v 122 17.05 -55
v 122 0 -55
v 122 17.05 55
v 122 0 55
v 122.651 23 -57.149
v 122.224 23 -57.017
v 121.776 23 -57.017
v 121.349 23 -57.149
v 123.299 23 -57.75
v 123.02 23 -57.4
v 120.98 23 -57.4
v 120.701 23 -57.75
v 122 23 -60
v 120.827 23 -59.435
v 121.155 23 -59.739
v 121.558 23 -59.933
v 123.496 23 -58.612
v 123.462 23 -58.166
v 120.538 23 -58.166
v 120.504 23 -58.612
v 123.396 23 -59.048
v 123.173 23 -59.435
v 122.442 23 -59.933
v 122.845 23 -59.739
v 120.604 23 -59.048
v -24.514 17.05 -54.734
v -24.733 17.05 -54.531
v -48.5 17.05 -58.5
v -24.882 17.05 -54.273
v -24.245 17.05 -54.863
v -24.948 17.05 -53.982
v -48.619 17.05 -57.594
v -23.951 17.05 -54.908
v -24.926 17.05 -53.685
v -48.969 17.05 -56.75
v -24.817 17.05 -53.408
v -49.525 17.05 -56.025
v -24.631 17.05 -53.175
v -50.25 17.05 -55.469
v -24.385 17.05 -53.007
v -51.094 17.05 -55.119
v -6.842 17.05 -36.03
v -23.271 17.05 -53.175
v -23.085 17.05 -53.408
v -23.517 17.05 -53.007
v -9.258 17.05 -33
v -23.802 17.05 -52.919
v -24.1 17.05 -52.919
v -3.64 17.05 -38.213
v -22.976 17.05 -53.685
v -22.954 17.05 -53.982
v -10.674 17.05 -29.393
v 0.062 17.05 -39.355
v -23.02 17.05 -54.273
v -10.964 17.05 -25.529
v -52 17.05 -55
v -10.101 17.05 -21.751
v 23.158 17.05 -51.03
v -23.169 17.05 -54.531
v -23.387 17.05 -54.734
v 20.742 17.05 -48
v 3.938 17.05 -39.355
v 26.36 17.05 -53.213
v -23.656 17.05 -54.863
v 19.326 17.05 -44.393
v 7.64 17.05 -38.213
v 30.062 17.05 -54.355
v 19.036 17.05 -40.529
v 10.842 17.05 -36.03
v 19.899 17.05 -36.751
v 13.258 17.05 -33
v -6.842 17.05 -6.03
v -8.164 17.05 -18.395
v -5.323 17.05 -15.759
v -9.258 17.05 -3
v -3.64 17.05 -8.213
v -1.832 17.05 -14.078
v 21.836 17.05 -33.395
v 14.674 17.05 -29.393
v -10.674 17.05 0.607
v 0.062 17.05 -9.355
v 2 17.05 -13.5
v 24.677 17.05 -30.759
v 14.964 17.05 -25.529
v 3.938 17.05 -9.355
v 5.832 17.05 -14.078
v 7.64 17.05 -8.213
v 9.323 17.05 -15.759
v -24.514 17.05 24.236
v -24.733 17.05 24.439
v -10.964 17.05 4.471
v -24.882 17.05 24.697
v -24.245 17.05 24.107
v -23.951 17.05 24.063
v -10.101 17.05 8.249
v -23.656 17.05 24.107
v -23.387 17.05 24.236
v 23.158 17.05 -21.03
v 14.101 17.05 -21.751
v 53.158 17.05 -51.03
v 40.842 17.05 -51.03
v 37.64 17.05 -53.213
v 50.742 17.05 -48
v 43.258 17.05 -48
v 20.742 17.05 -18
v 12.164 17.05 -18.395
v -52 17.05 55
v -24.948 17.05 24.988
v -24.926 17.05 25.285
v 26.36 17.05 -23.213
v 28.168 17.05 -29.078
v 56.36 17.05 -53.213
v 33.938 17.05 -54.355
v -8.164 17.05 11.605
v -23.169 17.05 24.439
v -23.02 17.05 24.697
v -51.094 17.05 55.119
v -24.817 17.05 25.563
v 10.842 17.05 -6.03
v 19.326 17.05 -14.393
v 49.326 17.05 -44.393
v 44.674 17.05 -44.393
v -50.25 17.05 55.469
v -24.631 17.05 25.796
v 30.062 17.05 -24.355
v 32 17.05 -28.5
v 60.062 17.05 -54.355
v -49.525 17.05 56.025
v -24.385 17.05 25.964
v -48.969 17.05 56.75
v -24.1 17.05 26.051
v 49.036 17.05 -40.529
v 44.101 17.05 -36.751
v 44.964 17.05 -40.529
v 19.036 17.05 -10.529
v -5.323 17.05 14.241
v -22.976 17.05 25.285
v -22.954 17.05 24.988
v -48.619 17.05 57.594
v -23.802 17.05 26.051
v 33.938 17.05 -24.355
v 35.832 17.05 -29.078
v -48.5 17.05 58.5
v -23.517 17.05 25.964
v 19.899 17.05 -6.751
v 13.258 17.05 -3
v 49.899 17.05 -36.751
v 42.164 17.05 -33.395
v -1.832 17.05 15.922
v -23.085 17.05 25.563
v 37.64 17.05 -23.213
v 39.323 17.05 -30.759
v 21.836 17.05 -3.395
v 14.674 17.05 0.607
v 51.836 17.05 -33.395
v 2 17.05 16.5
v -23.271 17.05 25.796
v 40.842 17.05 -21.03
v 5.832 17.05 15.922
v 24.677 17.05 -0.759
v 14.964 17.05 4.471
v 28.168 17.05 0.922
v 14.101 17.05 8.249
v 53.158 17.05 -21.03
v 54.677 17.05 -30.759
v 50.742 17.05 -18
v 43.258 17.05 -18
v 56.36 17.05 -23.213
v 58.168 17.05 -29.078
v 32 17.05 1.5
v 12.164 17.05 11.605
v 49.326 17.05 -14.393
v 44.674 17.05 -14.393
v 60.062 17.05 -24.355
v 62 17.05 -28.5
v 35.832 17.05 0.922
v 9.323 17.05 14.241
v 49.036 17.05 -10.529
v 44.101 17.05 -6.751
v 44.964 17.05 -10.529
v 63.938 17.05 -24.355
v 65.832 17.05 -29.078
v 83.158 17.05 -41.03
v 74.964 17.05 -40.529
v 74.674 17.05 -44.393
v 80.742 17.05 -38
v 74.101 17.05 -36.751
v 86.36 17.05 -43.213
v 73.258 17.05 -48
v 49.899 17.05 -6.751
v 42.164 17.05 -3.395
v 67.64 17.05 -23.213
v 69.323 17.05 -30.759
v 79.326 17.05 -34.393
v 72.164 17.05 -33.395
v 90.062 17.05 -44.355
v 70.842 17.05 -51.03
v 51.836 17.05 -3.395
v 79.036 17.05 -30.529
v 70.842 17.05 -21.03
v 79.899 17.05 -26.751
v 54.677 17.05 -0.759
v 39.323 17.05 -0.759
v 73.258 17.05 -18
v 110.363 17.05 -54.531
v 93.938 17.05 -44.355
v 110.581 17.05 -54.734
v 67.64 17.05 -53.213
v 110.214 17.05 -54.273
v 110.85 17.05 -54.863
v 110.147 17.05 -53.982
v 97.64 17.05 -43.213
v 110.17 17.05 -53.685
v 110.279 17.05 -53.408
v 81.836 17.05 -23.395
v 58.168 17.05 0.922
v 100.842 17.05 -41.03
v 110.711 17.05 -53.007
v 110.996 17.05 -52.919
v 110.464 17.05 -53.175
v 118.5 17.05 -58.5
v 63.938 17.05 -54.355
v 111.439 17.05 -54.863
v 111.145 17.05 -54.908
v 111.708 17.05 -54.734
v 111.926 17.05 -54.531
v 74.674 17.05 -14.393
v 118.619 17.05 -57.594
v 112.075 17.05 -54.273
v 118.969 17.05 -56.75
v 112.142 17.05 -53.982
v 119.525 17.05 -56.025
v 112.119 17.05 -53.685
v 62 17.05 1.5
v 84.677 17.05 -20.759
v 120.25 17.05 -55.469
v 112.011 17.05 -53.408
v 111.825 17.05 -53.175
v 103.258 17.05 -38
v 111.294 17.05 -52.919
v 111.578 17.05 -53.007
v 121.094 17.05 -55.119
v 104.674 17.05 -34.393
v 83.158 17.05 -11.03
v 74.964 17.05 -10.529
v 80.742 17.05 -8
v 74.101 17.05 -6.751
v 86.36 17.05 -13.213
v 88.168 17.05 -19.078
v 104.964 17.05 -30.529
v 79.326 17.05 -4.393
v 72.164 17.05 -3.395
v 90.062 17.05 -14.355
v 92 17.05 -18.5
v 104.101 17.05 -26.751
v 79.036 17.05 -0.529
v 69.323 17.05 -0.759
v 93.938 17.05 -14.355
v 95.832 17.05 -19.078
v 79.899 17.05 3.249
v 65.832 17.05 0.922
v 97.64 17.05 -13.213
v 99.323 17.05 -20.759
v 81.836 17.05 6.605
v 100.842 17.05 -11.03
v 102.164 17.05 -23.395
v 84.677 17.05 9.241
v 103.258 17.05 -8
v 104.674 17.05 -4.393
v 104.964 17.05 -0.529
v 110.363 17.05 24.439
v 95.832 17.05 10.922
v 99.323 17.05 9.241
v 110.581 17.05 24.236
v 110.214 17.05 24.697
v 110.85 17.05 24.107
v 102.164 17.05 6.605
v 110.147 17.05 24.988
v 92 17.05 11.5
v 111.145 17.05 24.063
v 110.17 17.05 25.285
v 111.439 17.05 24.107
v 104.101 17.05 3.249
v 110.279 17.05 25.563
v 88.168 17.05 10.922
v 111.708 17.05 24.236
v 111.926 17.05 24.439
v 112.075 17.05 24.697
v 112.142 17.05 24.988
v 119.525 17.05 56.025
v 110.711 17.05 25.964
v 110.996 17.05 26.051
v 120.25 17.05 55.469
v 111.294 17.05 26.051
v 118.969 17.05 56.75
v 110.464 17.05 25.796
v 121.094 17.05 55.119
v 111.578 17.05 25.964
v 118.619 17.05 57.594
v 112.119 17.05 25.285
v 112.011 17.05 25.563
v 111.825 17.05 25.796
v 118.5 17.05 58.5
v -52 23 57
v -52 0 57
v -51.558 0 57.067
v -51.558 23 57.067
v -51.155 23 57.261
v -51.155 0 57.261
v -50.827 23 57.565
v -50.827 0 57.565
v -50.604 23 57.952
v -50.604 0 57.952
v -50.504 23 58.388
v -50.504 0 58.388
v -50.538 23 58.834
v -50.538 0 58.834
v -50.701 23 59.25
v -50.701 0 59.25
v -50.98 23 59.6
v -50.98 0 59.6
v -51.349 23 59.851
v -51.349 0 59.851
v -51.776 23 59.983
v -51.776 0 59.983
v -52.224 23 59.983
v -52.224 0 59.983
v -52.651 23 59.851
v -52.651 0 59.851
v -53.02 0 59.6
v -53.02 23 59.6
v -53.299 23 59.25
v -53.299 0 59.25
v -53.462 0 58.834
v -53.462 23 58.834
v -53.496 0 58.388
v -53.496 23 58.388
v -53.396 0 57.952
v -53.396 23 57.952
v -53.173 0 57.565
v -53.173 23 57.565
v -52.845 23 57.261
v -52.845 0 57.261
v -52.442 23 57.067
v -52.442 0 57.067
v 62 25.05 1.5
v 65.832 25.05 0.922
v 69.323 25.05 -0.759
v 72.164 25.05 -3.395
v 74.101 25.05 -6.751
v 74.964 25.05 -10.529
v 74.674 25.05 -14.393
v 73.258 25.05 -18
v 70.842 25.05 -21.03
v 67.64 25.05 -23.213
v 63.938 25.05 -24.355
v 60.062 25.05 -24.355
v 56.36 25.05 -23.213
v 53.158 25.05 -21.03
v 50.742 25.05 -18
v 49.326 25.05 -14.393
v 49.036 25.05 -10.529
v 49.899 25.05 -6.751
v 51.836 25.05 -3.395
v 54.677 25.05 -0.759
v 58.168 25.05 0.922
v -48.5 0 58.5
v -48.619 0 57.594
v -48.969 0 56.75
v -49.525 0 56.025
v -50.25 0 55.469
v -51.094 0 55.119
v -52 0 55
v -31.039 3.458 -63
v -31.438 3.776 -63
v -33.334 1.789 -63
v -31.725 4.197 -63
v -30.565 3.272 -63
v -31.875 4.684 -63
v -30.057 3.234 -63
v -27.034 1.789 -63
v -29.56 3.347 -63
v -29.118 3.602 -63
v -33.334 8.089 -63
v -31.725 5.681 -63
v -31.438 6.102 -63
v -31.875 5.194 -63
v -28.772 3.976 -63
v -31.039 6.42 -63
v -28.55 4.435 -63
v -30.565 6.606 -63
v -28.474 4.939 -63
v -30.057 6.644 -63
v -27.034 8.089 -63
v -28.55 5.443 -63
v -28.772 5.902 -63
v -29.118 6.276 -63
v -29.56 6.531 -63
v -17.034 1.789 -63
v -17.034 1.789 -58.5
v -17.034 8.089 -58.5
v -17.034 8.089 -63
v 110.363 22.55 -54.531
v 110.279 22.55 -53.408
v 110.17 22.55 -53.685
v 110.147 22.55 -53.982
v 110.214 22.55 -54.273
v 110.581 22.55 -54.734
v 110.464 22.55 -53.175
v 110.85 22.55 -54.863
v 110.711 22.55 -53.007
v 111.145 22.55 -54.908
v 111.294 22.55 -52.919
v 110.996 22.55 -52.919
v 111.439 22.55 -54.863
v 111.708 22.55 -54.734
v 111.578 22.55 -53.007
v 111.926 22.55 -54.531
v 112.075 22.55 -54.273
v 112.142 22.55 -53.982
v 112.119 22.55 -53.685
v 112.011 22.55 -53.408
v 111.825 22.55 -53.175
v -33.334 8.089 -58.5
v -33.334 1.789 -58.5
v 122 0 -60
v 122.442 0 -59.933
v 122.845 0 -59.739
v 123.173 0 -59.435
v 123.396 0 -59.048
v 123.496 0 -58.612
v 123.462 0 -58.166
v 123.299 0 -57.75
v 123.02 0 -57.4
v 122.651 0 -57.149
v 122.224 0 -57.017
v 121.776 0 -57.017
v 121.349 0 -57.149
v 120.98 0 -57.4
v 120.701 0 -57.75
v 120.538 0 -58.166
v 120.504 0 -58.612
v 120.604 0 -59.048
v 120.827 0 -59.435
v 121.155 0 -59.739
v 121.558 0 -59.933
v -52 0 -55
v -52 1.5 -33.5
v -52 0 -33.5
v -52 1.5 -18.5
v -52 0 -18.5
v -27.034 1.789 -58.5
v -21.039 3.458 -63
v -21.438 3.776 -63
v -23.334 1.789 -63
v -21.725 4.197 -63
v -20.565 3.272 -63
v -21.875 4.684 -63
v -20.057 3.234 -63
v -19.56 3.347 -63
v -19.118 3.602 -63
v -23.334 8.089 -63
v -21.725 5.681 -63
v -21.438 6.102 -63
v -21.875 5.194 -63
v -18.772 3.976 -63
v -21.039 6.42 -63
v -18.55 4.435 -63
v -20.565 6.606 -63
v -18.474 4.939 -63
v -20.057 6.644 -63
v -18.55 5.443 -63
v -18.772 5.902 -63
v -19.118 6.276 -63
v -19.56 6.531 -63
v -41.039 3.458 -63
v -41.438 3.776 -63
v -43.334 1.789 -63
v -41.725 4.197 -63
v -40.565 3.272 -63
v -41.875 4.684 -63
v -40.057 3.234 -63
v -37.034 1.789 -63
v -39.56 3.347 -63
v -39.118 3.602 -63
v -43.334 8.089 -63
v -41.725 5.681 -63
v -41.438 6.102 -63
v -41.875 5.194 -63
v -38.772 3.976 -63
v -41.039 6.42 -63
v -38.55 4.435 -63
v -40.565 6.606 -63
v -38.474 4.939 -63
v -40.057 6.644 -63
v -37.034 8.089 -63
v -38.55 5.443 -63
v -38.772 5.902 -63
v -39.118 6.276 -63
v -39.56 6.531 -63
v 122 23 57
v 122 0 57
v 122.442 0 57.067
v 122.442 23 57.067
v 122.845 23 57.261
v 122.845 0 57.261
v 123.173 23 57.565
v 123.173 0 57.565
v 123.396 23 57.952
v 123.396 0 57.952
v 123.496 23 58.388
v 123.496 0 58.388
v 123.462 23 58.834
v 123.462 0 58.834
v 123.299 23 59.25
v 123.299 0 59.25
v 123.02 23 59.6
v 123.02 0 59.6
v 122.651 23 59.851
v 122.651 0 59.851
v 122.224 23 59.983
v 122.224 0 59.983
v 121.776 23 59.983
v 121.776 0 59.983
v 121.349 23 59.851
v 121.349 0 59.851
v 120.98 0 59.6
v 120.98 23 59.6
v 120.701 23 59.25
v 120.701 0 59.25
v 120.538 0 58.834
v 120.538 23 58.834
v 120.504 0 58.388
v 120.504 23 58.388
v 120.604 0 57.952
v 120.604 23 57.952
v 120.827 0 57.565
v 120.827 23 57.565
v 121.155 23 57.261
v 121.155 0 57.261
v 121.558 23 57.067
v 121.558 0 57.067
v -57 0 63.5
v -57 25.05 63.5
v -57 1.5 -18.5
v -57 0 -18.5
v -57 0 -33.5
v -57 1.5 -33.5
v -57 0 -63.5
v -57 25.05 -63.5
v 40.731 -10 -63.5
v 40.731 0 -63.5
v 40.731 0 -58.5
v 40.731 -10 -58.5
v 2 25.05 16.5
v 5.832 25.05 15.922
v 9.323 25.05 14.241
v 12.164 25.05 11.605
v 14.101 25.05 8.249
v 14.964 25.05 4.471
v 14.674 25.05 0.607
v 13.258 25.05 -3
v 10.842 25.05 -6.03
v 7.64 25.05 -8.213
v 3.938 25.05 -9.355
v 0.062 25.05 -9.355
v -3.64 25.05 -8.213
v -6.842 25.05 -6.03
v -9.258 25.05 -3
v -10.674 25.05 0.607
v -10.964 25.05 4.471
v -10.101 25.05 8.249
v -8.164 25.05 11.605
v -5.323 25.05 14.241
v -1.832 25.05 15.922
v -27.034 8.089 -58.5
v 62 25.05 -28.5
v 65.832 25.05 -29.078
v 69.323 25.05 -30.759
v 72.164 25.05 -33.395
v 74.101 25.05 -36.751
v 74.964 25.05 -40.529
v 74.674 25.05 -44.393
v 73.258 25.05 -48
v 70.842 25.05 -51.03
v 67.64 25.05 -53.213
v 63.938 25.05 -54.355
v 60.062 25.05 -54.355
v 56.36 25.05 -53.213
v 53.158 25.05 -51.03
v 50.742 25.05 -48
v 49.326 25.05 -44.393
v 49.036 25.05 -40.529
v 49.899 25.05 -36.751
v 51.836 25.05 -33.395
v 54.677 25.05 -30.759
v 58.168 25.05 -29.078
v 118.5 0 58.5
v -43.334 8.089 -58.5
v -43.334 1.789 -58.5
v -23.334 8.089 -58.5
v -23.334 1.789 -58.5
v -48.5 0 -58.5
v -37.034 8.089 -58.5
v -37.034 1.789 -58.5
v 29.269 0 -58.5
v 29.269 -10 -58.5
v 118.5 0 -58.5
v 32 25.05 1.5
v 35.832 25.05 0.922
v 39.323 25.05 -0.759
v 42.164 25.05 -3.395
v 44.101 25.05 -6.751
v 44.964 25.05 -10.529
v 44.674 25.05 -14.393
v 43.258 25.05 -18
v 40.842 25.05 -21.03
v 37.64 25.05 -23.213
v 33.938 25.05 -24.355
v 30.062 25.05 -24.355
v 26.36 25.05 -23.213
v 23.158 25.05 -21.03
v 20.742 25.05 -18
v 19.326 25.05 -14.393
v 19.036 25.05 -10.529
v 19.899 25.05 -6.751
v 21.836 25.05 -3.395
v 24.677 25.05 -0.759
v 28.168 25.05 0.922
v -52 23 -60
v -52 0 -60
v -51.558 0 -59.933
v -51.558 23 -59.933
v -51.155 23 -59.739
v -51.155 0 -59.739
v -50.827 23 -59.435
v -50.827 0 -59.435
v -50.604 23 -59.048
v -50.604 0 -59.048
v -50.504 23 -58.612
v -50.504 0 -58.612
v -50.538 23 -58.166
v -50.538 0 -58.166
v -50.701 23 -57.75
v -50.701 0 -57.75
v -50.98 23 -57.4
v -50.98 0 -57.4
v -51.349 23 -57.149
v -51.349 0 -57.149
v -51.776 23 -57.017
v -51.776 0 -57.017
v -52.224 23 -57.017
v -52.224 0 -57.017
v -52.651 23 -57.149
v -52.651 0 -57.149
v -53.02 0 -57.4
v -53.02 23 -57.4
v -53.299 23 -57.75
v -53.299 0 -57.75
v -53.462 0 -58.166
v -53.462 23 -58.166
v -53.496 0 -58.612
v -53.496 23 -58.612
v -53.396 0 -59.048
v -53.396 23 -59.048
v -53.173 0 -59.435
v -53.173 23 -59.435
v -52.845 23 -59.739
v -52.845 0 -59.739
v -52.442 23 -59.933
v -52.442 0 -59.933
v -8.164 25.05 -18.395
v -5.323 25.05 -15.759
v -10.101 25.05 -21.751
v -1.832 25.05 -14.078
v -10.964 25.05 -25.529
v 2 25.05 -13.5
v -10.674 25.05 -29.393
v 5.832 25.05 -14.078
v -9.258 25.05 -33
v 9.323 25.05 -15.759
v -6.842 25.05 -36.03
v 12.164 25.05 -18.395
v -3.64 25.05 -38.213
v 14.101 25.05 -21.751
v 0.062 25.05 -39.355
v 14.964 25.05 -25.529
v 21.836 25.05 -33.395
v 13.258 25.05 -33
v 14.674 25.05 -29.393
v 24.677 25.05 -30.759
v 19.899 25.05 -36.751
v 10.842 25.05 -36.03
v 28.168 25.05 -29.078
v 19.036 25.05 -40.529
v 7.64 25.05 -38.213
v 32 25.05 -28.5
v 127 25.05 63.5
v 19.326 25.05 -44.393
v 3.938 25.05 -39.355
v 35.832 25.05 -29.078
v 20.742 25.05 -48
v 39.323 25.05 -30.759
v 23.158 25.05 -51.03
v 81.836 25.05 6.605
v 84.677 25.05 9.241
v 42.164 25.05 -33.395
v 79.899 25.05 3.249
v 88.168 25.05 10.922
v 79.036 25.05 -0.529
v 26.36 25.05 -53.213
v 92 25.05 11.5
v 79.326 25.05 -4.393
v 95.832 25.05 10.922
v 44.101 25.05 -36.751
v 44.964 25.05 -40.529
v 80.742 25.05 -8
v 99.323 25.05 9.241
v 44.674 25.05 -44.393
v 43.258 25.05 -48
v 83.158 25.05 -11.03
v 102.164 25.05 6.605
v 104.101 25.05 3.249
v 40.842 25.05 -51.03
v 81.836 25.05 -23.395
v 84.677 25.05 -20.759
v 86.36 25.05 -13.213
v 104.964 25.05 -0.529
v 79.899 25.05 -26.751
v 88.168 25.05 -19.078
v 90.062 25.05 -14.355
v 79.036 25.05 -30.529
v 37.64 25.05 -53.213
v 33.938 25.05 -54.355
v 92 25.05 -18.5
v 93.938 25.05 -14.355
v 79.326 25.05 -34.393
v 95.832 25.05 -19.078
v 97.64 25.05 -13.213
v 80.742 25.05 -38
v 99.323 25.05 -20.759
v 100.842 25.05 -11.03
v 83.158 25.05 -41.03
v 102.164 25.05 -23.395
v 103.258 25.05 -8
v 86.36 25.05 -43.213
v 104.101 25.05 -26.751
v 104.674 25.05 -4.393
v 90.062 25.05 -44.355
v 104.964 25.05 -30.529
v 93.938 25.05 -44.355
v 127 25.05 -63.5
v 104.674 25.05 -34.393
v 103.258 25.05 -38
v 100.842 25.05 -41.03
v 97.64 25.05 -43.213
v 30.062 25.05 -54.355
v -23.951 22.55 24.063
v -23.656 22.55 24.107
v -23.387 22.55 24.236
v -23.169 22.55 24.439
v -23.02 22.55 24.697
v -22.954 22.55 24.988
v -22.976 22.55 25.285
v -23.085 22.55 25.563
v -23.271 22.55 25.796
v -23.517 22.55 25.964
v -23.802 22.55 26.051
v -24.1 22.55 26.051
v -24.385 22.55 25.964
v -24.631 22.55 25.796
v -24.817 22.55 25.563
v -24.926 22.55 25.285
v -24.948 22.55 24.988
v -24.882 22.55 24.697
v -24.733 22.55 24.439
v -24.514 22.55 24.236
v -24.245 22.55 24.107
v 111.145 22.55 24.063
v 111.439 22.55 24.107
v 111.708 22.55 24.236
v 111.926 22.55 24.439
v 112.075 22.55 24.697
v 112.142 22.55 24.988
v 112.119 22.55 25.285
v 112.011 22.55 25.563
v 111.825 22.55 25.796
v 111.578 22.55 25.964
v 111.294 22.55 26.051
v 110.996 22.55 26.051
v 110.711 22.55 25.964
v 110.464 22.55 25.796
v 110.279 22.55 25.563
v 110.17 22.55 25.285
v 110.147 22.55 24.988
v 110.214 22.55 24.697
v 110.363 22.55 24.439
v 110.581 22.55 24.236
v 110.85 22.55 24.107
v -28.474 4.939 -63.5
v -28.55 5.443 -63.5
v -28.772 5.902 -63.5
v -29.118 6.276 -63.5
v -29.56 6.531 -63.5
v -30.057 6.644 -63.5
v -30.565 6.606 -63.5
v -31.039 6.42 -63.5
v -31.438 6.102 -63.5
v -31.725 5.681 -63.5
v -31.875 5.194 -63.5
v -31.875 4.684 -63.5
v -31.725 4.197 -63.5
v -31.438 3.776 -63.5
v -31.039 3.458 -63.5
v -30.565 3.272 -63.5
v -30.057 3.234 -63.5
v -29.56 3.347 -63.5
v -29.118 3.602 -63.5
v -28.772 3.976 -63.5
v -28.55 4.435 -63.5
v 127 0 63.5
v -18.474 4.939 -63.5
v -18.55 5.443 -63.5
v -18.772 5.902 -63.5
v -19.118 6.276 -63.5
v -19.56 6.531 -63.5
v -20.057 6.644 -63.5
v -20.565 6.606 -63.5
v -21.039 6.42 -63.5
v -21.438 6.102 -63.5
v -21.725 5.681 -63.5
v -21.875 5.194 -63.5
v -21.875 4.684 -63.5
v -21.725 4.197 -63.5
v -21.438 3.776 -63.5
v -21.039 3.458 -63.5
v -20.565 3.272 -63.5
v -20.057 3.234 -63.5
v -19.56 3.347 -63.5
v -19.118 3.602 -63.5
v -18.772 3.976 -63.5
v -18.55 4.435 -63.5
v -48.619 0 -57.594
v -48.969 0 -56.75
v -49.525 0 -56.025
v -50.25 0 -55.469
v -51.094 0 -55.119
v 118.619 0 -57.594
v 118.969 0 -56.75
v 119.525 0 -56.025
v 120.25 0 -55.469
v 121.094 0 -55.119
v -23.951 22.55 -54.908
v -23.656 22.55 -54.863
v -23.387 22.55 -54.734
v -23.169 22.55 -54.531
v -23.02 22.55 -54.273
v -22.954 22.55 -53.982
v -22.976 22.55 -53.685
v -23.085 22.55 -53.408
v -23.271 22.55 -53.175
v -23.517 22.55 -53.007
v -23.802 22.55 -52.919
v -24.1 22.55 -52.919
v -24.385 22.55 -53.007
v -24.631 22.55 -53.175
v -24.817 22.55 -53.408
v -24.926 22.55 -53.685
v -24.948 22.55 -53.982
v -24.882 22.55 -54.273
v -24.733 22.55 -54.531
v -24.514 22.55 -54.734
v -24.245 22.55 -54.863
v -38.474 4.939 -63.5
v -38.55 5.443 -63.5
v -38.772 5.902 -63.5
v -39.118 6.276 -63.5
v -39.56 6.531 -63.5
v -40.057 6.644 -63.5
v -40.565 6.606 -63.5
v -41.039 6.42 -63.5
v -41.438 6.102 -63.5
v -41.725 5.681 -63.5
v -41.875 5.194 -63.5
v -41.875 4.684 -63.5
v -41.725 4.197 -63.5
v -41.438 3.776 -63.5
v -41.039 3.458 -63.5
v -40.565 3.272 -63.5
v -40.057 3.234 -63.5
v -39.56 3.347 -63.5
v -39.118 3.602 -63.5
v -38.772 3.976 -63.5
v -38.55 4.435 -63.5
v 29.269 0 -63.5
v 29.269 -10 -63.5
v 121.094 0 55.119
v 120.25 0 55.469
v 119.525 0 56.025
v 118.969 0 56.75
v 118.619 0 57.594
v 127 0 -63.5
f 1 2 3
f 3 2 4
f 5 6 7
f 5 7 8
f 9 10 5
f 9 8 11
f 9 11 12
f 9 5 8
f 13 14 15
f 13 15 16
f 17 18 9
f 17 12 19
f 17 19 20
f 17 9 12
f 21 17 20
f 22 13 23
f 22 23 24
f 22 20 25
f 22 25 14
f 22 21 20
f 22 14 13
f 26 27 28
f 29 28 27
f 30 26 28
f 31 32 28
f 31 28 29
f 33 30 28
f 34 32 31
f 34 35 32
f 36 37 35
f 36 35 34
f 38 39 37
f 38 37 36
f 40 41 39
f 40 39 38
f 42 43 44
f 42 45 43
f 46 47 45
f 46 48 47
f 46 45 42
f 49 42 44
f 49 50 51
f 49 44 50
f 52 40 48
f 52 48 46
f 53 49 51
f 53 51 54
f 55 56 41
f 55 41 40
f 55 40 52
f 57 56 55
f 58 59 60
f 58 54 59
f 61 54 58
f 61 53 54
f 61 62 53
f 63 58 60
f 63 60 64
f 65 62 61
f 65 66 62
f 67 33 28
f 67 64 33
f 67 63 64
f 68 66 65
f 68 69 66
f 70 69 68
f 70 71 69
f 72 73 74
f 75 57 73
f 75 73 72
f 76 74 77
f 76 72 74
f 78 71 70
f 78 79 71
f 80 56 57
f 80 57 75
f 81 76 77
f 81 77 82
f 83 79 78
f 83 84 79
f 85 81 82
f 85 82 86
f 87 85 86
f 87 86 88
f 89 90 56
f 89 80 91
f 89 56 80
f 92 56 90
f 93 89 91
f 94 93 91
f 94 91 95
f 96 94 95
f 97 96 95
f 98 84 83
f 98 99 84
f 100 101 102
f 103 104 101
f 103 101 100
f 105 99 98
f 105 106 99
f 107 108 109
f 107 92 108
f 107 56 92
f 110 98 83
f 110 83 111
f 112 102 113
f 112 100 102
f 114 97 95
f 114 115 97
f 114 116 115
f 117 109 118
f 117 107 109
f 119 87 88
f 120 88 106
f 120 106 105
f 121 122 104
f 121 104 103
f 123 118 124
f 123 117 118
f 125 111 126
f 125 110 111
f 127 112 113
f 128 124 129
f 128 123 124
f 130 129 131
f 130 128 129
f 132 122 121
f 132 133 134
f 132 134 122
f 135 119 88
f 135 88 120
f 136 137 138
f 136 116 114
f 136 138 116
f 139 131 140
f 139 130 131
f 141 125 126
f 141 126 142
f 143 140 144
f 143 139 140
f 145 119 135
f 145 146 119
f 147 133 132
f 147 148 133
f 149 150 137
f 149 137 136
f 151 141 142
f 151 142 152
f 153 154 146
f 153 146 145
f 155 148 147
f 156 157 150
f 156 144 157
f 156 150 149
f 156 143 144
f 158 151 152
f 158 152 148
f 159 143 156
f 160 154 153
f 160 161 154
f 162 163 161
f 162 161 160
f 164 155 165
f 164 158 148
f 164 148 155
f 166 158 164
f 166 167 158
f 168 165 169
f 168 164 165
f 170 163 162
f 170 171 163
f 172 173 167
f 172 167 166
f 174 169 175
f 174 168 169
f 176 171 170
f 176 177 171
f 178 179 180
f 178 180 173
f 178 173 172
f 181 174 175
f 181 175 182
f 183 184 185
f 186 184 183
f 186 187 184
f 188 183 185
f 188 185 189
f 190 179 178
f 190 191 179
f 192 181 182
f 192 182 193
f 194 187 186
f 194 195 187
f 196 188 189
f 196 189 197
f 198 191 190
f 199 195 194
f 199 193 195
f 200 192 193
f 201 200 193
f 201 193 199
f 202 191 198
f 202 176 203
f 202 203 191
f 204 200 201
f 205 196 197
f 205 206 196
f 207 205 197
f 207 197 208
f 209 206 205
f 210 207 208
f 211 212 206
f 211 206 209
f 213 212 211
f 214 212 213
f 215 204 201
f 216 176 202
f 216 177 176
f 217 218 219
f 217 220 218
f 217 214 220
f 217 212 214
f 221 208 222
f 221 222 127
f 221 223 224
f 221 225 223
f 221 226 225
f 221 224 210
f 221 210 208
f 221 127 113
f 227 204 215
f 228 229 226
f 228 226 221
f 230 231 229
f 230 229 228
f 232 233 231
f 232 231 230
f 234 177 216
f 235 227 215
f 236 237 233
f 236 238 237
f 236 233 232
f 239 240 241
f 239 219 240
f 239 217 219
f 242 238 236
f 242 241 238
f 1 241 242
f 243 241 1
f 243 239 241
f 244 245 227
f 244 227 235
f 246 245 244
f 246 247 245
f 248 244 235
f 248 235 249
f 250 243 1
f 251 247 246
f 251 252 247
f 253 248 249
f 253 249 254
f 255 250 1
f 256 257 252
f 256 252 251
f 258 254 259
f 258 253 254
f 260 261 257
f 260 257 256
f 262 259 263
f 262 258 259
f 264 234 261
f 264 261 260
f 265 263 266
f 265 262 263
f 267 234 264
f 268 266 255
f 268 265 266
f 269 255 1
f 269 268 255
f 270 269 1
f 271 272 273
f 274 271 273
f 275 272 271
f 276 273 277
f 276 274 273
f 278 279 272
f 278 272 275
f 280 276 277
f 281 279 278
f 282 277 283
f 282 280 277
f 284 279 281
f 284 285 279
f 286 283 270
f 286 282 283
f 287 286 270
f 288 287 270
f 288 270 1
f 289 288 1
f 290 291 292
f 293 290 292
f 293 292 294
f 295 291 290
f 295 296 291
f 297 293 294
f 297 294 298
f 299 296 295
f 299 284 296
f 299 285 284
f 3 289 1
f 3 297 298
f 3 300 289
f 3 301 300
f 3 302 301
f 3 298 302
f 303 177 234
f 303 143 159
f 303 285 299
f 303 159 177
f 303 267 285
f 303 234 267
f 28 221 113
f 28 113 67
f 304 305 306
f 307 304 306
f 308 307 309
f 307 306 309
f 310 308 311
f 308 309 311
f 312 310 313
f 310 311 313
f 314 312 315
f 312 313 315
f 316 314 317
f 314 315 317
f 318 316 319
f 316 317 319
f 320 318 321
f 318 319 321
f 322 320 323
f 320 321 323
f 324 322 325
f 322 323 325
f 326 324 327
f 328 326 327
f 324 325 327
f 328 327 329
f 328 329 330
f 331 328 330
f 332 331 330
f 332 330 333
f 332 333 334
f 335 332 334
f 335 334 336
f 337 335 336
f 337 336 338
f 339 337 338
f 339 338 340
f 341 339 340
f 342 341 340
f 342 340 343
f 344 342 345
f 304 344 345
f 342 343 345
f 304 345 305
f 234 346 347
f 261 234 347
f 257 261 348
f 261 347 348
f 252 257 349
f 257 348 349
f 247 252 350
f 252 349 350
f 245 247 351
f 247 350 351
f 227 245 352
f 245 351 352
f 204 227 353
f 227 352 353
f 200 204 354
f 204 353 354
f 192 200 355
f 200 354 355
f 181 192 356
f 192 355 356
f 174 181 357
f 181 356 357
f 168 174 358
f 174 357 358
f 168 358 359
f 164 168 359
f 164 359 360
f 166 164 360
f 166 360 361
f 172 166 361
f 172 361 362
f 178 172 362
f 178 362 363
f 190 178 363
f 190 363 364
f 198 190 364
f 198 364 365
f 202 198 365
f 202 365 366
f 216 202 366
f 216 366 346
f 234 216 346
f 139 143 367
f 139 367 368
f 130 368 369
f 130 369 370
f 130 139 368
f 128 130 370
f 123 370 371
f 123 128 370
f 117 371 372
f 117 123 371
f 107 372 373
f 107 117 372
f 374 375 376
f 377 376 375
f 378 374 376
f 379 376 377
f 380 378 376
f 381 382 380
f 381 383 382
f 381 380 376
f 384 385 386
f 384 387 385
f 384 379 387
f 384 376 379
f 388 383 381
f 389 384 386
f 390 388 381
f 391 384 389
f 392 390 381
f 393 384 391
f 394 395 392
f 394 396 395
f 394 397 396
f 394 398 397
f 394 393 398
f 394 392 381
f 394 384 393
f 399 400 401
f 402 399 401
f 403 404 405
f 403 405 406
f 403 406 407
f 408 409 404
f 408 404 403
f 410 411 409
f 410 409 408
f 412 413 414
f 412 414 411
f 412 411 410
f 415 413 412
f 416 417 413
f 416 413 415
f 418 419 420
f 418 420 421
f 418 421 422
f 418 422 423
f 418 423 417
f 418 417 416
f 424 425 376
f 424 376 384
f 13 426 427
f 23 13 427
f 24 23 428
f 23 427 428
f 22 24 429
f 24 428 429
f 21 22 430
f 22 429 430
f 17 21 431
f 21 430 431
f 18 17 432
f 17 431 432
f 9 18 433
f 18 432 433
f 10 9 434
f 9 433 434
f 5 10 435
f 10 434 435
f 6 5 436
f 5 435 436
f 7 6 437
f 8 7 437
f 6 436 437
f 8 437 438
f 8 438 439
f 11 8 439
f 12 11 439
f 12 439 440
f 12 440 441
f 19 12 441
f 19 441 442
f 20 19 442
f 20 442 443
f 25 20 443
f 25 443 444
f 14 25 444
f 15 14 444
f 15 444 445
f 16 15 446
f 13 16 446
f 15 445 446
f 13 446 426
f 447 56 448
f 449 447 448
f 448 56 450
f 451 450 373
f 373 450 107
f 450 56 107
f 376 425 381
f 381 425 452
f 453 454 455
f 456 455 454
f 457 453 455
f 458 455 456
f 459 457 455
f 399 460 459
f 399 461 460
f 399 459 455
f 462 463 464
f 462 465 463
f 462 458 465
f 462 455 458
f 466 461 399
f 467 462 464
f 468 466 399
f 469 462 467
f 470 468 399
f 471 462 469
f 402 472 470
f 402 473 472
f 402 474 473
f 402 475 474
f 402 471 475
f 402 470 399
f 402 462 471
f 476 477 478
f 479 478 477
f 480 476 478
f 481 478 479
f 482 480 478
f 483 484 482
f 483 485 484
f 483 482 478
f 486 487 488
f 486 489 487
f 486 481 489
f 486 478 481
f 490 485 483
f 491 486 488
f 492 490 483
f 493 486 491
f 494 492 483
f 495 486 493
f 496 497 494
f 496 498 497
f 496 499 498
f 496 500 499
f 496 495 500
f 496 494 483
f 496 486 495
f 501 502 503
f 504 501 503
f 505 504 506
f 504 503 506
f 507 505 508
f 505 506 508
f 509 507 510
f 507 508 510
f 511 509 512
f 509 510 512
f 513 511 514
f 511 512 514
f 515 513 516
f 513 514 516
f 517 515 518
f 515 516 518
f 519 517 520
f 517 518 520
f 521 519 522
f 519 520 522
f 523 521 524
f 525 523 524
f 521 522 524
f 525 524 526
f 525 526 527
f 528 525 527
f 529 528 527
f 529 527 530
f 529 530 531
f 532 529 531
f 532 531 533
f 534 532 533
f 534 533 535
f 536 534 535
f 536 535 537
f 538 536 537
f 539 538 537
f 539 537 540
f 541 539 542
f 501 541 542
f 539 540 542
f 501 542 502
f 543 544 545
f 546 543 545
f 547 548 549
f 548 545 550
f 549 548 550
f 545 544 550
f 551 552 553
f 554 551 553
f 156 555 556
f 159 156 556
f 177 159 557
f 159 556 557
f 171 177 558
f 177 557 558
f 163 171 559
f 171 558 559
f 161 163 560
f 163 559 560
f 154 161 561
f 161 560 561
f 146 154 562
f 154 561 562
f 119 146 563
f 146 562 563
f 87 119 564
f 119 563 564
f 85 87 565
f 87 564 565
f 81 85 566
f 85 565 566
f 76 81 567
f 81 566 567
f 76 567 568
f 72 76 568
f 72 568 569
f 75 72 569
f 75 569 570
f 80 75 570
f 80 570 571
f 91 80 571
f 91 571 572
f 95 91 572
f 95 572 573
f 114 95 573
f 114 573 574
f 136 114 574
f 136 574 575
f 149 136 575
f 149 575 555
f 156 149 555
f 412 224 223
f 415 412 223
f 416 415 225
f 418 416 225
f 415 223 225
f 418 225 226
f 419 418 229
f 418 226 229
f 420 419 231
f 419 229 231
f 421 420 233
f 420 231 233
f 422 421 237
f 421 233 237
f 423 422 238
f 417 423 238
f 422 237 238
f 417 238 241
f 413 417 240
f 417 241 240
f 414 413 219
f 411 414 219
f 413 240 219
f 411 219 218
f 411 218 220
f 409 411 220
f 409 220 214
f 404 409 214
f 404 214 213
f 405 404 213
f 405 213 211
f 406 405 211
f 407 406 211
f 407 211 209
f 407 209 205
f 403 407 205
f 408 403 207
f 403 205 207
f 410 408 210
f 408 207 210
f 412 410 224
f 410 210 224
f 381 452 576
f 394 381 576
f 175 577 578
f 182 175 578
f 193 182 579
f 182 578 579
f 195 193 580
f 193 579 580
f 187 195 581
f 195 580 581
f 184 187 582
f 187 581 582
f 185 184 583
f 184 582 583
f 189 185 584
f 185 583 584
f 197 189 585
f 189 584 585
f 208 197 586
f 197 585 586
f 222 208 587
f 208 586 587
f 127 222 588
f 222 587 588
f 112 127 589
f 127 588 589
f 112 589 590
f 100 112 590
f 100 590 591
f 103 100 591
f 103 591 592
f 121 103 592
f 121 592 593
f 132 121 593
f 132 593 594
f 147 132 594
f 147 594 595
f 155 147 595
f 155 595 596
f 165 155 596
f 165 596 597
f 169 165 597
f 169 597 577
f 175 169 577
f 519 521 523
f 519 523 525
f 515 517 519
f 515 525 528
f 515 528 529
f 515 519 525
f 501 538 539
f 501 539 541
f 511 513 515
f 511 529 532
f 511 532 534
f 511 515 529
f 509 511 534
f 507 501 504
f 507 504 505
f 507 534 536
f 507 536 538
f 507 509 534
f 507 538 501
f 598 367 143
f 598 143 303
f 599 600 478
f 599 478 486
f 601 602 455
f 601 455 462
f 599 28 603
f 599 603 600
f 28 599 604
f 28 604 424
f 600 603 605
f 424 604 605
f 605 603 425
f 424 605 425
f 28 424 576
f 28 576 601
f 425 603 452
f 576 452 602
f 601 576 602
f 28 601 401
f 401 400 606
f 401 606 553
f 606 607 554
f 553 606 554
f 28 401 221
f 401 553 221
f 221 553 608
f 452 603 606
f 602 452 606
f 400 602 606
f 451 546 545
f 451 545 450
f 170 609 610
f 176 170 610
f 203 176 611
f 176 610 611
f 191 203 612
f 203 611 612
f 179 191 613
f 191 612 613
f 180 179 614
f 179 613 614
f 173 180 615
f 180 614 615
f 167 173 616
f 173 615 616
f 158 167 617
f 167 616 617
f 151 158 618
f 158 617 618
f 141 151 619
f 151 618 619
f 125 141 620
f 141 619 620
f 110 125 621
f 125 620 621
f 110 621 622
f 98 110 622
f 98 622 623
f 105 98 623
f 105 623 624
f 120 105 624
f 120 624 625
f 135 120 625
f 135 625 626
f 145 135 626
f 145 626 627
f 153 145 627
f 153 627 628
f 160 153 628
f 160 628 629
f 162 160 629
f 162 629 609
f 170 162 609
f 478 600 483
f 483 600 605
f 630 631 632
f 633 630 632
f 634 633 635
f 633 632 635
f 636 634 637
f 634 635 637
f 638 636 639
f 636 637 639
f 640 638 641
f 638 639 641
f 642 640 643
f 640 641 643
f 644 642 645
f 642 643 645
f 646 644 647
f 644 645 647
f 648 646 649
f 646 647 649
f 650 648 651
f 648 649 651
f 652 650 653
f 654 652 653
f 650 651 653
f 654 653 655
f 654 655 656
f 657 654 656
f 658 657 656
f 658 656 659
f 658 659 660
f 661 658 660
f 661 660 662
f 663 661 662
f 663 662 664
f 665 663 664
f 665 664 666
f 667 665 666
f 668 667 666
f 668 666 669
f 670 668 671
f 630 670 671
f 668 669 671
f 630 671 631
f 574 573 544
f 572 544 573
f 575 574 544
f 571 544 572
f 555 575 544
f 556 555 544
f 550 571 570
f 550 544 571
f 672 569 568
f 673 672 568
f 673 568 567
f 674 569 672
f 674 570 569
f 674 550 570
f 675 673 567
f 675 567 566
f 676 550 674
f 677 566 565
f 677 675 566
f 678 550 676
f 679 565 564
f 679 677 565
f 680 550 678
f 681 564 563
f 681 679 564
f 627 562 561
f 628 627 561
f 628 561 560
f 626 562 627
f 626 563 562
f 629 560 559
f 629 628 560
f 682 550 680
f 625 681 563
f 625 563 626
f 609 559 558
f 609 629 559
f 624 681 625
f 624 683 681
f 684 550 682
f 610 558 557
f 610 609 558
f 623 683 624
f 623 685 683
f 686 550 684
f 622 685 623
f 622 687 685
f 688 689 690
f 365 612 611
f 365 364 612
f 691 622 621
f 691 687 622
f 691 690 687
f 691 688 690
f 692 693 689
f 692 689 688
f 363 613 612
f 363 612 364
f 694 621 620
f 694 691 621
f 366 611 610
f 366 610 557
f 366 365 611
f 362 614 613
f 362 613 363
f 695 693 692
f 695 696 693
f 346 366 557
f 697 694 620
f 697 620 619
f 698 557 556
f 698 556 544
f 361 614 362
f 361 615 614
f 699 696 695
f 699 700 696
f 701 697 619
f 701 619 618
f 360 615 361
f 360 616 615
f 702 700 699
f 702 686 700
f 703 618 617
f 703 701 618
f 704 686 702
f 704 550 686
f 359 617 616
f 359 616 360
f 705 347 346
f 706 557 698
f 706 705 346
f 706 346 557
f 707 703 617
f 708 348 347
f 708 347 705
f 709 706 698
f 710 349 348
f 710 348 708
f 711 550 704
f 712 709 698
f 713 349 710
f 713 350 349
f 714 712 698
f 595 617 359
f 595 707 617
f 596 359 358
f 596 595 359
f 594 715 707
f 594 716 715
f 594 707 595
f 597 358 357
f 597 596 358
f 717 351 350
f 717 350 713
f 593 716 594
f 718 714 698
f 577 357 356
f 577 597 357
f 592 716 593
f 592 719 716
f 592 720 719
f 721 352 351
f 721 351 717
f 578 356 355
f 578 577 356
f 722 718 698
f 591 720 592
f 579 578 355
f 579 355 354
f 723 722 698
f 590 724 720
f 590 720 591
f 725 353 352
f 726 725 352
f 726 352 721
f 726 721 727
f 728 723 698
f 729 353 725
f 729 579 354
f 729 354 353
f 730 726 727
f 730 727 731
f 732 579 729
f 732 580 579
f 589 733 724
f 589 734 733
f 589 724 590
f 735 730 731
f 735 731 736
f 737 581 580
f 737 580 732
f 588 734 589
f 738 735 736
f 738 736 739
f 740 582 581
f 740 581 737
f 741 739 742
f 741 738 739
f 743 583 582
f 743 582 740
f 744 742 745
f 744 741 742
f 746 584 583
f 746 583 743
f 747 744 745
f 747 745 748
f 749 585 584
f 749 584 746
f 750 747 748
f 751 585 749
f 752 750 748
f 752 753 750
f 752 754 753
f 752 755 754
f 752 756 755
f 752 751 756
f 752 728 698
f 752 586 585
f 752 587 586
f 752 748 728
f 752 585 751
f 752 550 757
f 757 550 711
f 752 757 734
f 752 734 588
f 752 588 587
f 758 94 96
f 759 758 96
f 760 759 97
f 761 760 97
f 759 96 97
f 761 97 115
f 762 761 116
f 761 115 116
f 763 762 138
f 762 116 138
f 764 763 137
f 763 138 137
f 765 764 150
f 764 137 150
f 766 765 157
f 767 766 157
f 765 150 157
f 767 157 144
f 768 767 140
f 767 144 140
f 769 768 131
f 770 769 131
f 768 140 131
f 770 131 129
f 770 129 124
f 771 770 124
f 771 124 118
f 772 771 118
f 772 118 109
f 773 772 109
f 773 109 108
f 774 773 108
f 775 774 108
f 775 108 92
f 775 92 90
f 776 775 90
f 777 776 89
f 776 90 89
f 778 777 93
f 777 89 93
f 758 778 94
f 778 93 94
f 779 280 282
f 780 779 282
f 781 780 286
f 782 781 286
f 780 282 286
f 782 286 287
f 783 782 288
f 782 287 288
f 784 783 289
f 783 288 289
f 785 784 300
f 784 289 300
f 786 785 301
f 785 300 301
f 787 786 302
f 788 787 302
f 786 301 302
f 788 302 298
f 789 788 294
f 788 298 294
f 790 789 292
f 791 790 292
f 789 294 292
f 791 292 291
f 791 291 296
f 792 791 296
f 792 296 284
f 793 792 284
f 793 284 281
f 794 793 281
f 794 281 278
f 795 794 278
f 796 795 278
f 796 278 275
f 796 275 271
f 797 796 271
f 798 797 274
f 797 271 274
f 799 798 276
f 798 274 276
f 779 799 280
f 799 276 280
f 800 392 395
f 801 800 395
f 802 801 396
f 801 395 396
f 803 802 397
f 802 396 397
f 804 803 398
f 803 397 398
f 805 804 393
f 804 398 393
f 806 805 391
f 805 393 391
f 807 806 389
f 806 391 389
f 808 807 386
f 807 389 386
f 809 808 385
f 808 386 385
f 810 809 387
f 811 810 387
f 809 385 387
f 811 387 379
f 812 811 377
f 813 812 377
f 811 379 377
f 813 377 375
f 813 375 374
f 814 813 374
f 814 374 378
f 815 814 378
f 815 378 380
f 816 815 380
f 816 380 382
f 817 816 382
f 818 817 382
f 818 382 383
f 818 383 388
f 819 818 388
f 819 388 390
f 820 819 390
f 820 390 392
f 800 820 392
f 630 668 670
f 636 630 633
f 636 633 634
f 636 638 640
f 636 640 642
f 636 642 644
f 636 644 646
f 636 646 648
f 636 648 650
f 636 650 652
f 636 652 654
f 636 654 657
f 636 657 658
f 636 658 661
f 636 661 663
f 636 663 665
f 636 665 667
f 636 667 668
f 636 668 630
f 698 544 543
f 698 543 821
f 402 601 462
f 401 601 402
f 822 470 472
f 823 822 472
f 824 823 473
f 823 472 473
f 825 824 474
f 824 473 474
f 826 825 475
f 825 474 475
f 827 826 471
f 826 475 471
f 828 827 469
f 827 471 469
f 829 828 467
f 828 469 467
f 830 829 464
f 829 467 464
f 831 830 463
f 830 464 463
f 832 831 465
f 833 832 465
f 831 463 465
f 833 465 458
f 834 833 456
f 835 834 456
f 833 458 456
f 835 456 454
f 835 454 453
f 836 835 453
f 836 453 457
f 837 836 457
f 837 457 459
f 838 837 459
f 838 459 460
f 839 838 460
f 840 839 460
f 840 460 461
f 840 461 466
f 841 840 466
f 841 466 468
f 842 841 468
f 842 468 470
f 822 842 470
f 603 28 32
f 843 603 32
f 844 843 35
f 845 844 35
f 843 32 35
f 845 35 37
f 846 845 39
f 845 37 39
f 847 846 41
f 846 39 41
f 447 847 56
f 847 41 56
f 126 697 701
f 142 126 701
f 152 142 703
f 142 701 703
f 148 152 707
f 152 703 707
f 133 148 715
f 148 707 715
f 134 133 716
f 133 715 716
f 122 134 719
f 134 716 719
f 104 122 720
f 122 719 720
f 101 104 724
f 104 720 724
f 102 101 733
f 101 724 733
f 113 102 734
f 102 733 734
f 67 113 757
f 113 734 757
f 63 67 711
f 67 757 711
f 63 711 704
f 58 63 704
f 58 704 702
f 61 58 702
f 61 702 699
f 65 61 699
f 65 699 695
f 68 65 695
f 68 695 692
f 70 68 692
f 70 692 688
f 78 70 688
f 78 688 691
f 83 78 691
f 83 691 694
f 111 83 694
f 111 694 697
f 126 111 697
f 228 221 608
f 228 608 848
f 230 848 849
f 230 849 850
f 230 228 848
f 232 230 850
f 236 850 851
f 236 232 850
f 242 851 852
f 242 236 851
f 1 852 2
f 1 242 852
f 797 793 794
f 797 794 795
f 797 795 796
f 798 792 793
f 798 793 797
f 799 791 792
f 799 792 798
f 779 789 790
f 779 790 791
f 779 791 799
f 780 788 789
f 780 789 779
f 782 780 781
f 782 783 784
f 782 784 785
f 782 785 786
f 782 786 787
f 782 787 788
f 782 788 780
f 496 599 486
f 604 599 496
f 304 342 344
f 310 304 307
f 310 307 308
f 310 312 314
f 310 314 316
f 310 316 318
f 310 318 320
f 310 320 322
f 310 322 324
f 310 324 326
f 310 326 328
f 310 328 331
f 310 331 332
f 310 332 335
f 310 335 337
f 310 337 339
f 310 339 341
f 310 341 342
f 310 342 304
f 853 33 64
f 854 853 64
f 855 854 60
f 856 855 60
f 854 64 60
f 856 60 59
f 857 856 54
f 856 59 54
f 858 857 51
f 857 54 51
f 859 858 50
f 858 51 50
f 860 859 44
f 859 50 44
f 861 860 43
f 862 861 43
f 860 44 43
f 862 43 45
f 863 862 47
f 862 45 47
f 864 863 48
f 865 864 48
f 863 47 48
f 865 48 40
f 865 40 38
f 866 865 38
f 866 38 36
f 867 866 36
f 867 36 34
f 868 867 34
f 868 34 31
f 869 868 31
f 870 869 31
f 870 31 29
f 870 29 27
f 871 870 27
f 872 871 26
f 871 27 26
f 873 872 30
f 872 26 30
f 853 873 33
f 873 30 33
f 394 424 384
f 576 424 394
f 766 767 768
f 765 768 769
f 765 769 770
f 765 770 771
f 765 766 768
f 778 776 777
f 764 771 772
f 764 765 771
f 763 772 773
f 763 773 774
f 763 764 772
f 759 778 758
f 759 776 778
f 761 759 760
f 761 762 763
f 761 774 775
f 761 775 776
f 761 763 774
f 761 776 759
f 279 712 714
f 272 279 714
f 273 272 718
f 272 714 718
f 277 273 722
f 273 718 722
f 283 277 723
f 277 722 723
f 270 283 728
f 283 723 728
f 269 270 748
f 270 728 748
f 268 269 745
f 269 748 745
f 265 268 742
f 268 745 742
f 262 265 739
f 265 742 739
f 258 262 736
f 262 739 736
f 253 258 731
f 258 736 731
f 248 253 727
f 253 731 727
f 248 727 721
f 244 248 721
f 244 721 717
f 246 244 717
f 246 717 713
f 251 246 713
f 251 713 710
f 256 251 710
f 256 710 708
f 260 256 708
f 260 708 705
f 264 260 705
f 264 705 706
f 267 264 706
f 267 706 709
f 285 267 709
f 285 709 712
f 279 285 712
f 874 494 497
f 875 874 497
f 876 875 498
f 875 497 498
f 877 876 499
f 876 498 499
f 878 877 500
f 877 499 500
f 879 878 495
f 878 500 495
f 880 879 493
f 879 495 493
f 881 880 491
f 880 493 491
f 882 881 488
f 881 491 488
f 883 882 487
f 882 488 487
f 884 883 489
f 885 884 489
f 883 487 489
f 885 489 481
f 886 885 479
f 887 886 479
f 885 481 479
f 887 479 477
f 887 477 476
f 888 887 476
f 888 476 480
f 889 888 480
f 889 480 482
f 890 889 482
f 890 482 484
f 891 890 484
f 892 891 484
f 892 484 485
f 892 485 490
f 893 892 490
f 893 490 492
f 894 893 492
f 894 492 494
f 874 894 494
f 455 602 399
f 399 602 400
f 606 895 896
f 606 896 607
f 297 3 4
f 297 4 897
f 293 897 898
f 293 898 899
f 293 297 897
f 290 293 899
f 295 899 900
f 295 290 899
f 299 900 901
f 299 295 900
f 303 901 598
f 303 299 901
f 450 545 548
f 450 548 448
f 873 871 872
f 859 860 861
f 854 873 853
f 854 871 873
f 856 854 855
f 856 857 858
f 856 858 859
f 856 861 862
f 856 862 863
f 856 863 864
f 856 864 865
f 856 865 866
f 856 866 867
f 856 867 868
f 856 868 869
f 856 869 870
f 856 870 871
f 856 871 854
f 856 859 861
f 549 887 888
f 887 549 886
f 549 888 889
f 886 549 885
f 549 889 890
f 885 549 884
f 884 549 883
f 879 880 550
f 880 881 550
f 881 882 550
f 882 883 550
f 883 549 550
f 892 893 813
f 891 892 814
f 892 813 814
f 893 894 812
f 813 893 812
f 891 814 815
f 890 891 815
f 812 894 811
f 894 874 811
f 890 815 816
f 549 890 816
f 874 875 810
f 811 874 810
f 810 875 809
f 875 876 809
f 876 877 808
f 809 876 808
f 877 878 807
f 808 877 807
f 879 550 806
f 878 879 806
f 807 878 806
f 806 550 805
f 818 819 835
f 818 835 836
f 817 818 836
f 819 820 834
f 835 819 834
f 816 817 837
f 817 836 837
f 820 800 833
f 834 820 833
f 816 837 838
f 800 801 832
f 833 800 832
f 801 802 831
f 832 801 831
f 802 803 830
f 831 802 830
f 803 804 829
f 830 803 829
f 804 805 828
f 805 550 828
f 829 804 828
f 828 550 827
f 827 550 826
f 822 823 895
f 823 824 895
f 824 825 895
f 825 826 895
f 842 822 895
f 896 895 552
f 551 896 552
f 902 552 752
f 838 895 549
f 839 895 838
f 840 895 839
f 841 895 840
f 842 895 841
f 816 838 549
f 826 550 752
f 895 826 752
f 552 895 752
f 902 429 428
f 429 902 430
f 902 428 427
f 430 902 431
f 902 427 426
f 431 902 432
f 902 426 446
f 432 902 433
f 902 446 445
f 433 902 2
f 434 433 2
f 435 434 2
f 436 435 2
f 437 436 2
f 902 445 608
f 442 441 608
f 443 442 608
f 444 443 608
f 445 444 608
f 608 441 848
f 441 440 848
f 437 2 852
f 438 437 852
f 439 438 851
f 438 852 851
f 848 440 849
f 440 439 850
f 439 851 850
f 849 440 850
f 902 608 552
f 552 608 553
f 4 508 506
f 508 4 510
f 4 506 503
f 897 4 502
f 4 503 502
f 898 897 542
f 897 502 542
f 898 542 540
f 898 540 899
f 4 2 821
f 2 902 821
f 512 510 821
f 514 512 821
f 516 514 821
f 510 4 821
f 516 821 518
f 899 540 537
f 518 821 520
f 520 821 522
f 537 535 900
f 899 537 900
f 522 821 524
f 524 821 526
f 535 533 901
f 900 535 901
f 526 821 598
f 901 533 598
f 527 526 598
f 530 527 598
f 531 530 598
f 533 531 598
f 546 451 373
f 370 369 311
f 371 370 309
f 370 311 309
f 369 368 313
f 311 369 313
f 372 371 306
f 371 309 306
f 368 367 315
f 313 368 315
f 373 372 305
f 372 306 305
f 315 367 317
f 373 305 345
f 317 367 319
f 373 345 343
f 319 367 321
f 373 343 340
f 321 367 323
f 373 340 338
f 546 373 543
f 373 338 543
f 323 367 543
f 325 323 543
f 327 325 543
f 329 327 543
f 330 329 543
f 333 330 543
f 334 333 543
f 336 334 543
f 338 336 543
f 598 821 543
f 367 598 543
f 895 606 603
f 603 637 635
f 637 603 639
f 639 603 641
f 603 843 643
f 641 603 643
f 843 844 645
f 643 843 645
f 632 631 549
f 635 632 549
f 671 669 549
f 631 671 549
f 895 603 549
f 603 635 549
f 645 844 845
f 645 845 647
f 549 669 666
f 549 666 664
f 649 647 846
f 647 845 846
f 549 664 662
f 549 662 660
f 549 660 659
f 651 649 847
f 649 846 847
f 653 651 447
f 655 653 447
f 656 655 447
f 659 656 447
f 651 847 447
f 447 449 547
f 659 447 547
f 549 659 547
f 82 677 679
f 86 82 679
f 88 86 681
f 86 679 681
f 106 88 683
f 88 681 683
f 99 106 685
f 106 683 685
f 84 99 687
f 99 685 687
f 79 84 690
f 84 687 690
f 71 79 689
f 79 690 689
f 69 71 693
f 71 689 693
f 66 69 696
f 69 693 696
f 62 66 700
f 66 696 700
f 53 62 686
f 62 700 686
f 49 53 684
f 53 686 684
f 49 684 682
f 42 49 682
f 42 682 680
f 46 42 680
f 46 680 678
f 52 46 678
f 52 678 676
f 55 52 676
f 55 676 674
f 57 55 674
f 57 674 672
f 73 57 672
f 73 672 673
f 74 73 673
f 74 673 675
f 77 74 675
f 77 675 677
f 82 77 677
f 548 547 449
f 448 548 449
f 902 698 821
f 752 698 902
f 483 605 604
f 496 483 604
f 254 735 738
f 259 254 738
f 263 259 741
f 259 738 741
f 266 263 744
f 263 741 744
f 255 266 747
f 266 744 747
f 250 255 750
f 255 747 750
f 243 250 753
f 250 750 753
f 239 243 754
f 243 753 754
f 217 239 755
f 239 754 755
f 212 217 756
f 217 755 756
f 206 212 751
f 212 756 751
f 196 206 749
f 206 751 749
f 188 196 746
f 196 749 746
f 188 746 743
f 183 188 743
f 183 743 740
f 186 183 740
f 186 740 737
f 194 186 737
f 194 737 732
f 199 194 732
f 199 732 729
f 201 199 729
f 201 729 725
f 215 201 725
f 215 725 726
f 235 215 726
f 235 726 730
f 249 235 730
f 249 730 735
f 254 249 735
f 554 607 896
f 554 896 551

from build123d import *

# Parameters (mm, degrees)
SKETCH1_W           = 254
SKETCH1_H           = 127
BOSS_EXTRUDE2_DEPTH = 19.05
SKETCH2_W           = 244
SKETCH2_H           = 117
CUT_EXTRUDE1_DEPTH  = 17.05
SKETCH4_R           = 13
CUT_EXTRUDE2_DEPTH  = 17.05
SKETCH5_W           = 70
SKETCH5_H           = 127
CUT_EXTRUDE3_DEPTH  = 45
SKETCH6_W           = 5
SKETCH6_H           = 117
BOSS_EXTRUDE3_DEPTH = 17.05
BOSS_EXTRUDE4_START = 6
SKETCH7_W           = 184
SKETCH7_H           = 127
SKETCH7_R           = 13
BOSS_EXTRUDE4_DEPTH = 6
BOSS_EXTRUDE5_DEPTH = 17.05
SKETCH9_W           = 11.462803728
SKETCH9_H           = 5
BOSS_EXTRUDE6_DEPTH = 10
SKETCH10_R          = 1.5
CUT_EXTRUDE4_DEPTH  = 23
SKETCH11_W          = 5
SKETCH11_H          = 15
CUT_EXTRUDE6_DEPTH  = 1.5
SKETCH13_W          = 6.3
SKETCH13_H          = 6.3
CUT_EXTRUDE8_DEPTH  = 4.5
SKETCH16_R          = 1
CUT_EXTRUDE10_DEPTH = 5.5
SKETCH17_R          = 1.71
CUT_EXTRUDE11_DEPTH = 10


with BuildPart() as part:
    # Sketch1 → Boss-Extrude2 (new body)
    with BuildSketch(Plane(origin=(0, 0, 0), x_dir=(1, 0, 0), z_dir=(0, 1, 0))):
        Rectangle(SKETCH1_W, SKETCH1_H)
    extrude(amount=BOSS_EXTRUDE2_DEPTH)

    # Sketch2 → Cut-Extrude1 (cut)
    with BuildSketch(Plane.XZ):
        Rectangle(SKETCH2_W, SKETCH2_H)
    extrude(amount=-CUT_EXTRUDE1_DEPTH, mode=Mode.SUBTRACT)

    # Sketch4 → Cut-Extrude2 (cut)
    with BuildSketch(Plane(origin=(0, 19.05, 0), x_dir=(1, 0, 0), z_dir=(0, 1, 0))):
        with Locations(Location((92, 1.5, 0), (0, 0, 270))):
            Circle(SKETCH4_R)
        with Locations(Location((92, 31.5, 0), (0, 0, 270))):
            Circle(SKETCH4_R)
        with Locations(Location((62, 11.5, 0), (0, 0, 270))):
            Circle(SKETCH4_R)
        with Locations(Location((62, 41.5, 0), (0, 0, 270))):
            Circle(SKETCH4_R)
        with Locations(Location((32, 11.5, 0), (0, 0, 270))):
            Circle(SKETCH4_R)
        with Locations(Location((32, 41.5, 0), (0, 0, 270))):
            Circle(SKETCH4_R)
        with Locations(Location((2, -3.5, 0), (0, 0, 270))):
            Circle(SKETCH4_R)
        with Locations(Location((2, 26.5, 0), (0, 0, 270))):
            Circle(SKETCH4_R)
    extrude(amount=-CUT_EXTRUDE2_DEPTH, mode=Mode.SUBTRACT)

    # Sketch5 → Cut-Extrude3 (cut)
    with BuildSketch(Plane.XZ):
        with Locations((-92, 0)):
            Rectangle(SKETCH5_W, SKETCH5_H)
    extrude(amount=-CUT_EXTRUDE3_DEPTH, mode=Mode.SUBTRACT)

    # Sketch6 → Boss-Extrude3 (add)
    with BuildSketch(Plane.XZ.offset(-17.05)):
        with Locations((-54.5, 0)):
            Rectangle(SKETCH6_W, SKETCH6_H)
    extrude(amount=BOSS_EXTRUDE3_DEPTH)

    # Sketch7 → Boss-Extrude4 (add)
    with BuildSketch(Plane(origin=(0, 19.05, 0), x_dir=(1, 0, 0), z_dir=(0, 1, 0)).offset(BOSS_EXTRUDE4_START)):
        with Locations((35, 0)):
            Rectangle(SKETCH7_W, SKETCH7_H)
        with Locations(Location((2, 26.5, 0), (0, 0, 270))):
            Circle(SKETCH7_R, mode=Mode.SUBTRACT)
        with Locations(Location((2, -3.5, 0), (0, 0, 270))):
            Circle(SKETCH7_R, mode=Mode.SUBTRACT)
        with Locations(Location((32, 11.5, 0), (0, 0, 270))):
            Circle(SKETCH7_R, mode=Mode.SUBTRACT)
        with Locations(Location((92, 31.5, 0), (0, 0, 270))):
            Circle(SKETCH7_R, mode=Mode.SUBTRACT)
        with Locations(Location((62, 11.5, 0), (0, 0, 270))):
            Circle(SKETCH7_R, mode=Mode.SUBTRACT)
        with Locations(Location((62, 41.5, 0), (0, 0, 270))):
            Circle(SKETCH7_R, mode=Mode.SUBTRACT)
        with Locations(Location((32, 41.5, 0), (0, 0, 270))):
            Circle(SKETCH7_R, mode=Mode.SUBTRACT)
        with Locations(Location((92, 1.5, 0), (0, 0, 270))):
            Circle(SKETCH7_R, mode=Mode.SUBTRACT)
    extrude(amount=-BOSS_EXTRUDE4_DEPTH)

    # Sketch8 → Boss-Extrude5 (add)
    with BuildSketch(Plane.XZ.offset(-17.05)):
        with BuildLine():
            Line((118.5, 58.5), (122, 58.5))
            Line((122, 58.5), (122, 55))
            ThreePointArc((122, 55), (119.525126266, 56.025126266), (118.5, 58.5))
        make_face()
        with BuildLine():
            Line((122, -55), (122, -58.5))
            Line((122, -58.5), (118.5, -58.5))
            ThreePointArc((118.5, -58.5), (119.525126266, -56.025126266), (122, -55))
        make_face()
        with BuildLine():
            Line((-52, -55), (-52, -58.5))
            Line((-52, -58.5), (-48.5, -58.5))
            ThreePointArc((-48.5, -58.5), (-49.525126266, -56.025126266), (-52, -55))
        make_face()
        with BuildLine():
            Line((-52, 55), (-52, 58.5))
            Line((-52, 58.5), (-48.5, 58.5))
            ThreePointArc((-48.5, 58.5), (-49.525126266, 56.025126266), (-52, 55))
        make_face()
    extrude(amount=BOSS_EXTRUDE5_DEPTH)

    # Sketch9 → Boss-Extrude6 (add)
    with BuildSketch(Plane.XZ):
        with Locations((35, -61)):
            Rectangle(SKETCH9_W, SKETCH9_H)
    extrude(amount=BOSS_EXTRUDE6_DEPTH)

    # Sketch10 → Cut-Extrude4 (cut)
    with BuildSketch(Plane.XZ):
        with Locations(Location((122, -58.5, 0), (0, 0, 270))):
            Circle(SKETCH10_R)
        with Locations(Location((122, 58.5, 0), (0, 0, 270))):
            Circle(SKETCH10_R)
        with Locations(Location((-52, -58.5, 0), (0, 0, 270))):
            Circle(SKETCH10_R)
        with Locations(Location((-52, 58.5, 0), (0, 0, 270))):
            Circle(SKETCH10_R)
    extrude(amount=-CUT_EXTRUDE4_DEPTH, mode=Mode.SUBTRACT)

    # Sketch11 → Cut-Extrude6 (cut)
    with BuildSketch(Plane.XZ):
        with Locations((-54.5, -26)):
            Rectangle(SKETCH11_W, SKETCH11_H)
    extrude(amount=-CUT_EXTRUDE6_DEPTH, mode=Mode.SUBTRACT)

    # Sketch13 → Cut-Extrude8 (cut)
    with BuildSketch(Plane.XY.offset(-58.5)):
        with Locations((-30.184481008, 4.938954373)):
            Rectangle(SKETCH13_W, SKETCH13_H)
        with Locations((-40.184481008, 4.938954373)):
            Rectangle(SKETCH13_W, SKETCH13_H)
        with Locations((-20.184481008, 4.938954373)):
            Rectangle(SKETCH13_W, SKETCH13_H)
    extrude(amount=-CUT_EXTRUDE8_DEPTH, mode=Mode.SUBTRACT)

    # Sketch16 → Cut-Extrude10 (cut)
    with BuildSketch(Plane.XZ.offset(-17.05)):
        with Locations(Location((111.144556631, 25.062533315, 0), (0, 0, 270))):
            Circle(SKETCH16_R)
        with Locations(Location((111.144556631, -53.90768708, 0), (0, 0, 270))):
            Circle(SKETCH16_R)
        with Locations(Location((-23.950730393, -53.90768708, 0), (0, 0, 270))):
            Circle(SKETCH16_R)
        with Locations(Location((-23.950730393, 25.062533315, 0), (0, 0, 270))):
            Circle(SKETCH16_R)
    extrude(amount=-CUT_EXTRUDE10_DEPTH, mode=Mode.SUBTRACT)

    # Sketch17 → Cut-Extrude11 (cut)
    with BuildSketch(Plane.XY.offset(-63)):
        with Locations((-40.184481008, 4.938954373)):
            Circle(SKETCH17_R)
        with Locations((-30.184481008, 4.938954373)):
            Circle(SKETCH17_R)
        with Locations((-20.184481008, 4.938954373)):
            Circle(SKETCH17_R)
    extrude(amount=-CUT_EXTRUDE11_DEPTH, mode=Mode.SUBTRACT)


solid = part.part
